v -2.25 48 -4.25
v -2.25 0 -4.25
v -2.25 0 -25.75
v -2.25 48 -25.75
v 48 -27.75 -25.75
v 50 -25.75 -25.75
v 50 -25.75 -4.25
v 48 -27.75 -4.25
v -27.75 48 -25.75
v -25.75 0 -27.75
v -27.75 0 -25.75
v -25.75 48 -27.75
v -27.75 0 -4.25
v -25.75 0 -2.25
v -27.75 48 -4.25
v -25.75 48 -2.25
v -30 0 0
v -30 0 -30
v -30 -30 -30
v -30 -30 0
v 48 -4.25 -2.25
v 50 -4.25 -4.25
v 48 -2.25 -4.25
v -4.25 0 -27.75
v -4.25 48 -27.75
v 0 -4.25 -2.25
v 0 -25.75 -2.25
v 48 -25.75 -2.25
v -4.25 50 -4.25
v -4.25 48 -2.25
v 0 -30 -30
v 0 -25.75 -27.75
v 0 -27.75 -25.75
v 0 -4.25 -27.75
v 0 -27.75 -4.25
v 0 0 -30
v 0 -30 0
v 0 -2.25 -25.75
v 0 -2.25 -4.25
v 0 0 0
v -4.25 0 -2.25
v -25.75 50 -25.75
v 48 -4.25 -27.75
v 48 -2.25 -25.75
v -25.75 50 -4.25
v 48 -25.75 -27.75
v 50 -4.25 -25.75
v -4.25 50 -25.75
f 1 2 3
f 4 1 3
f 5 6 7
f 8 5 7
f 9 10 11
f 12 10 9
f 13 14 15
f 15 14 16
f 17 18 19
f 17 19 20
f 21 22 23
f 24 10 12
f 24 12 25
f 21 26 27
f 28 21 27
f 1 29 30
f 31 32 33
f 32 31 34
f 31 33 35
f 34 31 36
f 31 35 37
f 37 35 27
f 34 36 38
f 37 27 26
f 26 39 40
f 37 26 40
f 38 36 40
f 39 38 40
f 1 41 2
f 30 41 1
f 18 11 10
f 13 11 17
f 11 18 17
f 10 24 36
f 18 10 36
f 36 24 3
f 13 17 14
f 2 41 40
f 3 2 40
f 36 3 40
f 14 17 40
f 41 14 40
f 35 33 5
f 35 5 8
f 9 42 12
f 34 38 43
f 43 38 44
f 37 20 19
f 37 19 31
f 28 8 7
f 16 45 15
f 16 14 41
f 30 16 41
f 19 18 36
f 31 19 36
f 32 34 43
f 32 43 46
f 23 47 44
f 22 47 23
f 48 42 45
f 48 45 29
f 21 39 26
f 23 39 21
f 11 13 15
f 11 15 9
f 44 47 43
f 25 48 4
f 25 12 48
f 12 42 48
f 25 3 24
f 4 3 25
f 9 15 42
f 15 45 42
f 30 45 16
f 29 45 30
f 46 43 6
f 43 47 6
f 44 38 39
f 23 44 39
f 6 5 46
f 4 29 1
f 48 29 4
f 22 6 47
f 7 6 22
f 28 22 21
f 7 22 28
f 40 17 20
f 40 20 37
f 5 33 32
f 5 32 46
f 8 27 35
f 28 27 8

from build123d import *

# Parameters (mm, degrees)
SKETCH007_W     = 30
SKETCH007_H     = 30
PAD007_DEPTH    = 30
SKETCH008_W     = 25.5
SKETCH008_H     = 25.5
PAD008_DEPTH    = 50
CHAMFER002_SIZE = 2
SKETCH009_W     = 25.5
SKETCH009_H     = 25.5
PAD009_DEPTH    = 50
CHAMFER003_SIZE = 2


with BuildPart() as part:
    # Sketch007 → Pad007 (new body)
    with BuildSketch(Plane.XZ):
        with Locations((-15, -15)):
            Rectangle(SKETCH007_W, SKETCH007_H)
    extrude(amount=PAD007_DEPTH)

    # Sketch008 (on Face4 of Pad007) → Pad008 (join)
    with BuildSketch(Plane(origin=(0, 0, 0), x_dir=(0, 0, 1), z_dir=(1, 0, 0))):
        with Locations((-15, 15)):
            Rectangle(SKETCH008_W, SKETCH008_H)
    extrude(amount=PAD008_DEPTH)

    # Chamfer002
    chamfer002_edges = [part.edges().sort_by_distance(p)[0] for p in [
        (25, -27.75, -2.25),
        (25, -27.75, -27.75),
        (50, -27.75, -15),
        (50, -15, -2.25),
        (50, -15, -27.75),
        (50, -2.25, -15),
        (25, -2.25, -2.25),
        (25, -2.25, -27.75),
    ]]
    chamfer(chamfer002_edges, length=CHAMFER002_SIZE)

    # Sketch009 (on Face11 of Chamfer002) → Pad009 (join)
    with BuildSketch(Plane(origin=(0, 0, 0), x_dir=(1, 0, 0), z_dir=(0, 1, 0))):
        with Locations((-15, 15)):
            Rectangle(SKETCH009_W, SKETCH009_H)
    extrude(amount=PAD009_DEPTH)

    # Chamfer003
    chamfer003_edges = [part.edges().sort_by_distance(p)[0] for p in [
        (-2.25, 50, -15),
        (-15, 50, -27.75),
        (-27.75, 50, -15),
        (-15, 50, -2.25),
        (-27.75, 25, -2.25),
        (-27.75, 25, -27.75),
        (-2.25, 25, -2.25),
        (-2.25, 25, -27.75),
    ]]
    chamfer(chamfer003_edges, length=CHAMFER003_SIZE)


solid = part.part
